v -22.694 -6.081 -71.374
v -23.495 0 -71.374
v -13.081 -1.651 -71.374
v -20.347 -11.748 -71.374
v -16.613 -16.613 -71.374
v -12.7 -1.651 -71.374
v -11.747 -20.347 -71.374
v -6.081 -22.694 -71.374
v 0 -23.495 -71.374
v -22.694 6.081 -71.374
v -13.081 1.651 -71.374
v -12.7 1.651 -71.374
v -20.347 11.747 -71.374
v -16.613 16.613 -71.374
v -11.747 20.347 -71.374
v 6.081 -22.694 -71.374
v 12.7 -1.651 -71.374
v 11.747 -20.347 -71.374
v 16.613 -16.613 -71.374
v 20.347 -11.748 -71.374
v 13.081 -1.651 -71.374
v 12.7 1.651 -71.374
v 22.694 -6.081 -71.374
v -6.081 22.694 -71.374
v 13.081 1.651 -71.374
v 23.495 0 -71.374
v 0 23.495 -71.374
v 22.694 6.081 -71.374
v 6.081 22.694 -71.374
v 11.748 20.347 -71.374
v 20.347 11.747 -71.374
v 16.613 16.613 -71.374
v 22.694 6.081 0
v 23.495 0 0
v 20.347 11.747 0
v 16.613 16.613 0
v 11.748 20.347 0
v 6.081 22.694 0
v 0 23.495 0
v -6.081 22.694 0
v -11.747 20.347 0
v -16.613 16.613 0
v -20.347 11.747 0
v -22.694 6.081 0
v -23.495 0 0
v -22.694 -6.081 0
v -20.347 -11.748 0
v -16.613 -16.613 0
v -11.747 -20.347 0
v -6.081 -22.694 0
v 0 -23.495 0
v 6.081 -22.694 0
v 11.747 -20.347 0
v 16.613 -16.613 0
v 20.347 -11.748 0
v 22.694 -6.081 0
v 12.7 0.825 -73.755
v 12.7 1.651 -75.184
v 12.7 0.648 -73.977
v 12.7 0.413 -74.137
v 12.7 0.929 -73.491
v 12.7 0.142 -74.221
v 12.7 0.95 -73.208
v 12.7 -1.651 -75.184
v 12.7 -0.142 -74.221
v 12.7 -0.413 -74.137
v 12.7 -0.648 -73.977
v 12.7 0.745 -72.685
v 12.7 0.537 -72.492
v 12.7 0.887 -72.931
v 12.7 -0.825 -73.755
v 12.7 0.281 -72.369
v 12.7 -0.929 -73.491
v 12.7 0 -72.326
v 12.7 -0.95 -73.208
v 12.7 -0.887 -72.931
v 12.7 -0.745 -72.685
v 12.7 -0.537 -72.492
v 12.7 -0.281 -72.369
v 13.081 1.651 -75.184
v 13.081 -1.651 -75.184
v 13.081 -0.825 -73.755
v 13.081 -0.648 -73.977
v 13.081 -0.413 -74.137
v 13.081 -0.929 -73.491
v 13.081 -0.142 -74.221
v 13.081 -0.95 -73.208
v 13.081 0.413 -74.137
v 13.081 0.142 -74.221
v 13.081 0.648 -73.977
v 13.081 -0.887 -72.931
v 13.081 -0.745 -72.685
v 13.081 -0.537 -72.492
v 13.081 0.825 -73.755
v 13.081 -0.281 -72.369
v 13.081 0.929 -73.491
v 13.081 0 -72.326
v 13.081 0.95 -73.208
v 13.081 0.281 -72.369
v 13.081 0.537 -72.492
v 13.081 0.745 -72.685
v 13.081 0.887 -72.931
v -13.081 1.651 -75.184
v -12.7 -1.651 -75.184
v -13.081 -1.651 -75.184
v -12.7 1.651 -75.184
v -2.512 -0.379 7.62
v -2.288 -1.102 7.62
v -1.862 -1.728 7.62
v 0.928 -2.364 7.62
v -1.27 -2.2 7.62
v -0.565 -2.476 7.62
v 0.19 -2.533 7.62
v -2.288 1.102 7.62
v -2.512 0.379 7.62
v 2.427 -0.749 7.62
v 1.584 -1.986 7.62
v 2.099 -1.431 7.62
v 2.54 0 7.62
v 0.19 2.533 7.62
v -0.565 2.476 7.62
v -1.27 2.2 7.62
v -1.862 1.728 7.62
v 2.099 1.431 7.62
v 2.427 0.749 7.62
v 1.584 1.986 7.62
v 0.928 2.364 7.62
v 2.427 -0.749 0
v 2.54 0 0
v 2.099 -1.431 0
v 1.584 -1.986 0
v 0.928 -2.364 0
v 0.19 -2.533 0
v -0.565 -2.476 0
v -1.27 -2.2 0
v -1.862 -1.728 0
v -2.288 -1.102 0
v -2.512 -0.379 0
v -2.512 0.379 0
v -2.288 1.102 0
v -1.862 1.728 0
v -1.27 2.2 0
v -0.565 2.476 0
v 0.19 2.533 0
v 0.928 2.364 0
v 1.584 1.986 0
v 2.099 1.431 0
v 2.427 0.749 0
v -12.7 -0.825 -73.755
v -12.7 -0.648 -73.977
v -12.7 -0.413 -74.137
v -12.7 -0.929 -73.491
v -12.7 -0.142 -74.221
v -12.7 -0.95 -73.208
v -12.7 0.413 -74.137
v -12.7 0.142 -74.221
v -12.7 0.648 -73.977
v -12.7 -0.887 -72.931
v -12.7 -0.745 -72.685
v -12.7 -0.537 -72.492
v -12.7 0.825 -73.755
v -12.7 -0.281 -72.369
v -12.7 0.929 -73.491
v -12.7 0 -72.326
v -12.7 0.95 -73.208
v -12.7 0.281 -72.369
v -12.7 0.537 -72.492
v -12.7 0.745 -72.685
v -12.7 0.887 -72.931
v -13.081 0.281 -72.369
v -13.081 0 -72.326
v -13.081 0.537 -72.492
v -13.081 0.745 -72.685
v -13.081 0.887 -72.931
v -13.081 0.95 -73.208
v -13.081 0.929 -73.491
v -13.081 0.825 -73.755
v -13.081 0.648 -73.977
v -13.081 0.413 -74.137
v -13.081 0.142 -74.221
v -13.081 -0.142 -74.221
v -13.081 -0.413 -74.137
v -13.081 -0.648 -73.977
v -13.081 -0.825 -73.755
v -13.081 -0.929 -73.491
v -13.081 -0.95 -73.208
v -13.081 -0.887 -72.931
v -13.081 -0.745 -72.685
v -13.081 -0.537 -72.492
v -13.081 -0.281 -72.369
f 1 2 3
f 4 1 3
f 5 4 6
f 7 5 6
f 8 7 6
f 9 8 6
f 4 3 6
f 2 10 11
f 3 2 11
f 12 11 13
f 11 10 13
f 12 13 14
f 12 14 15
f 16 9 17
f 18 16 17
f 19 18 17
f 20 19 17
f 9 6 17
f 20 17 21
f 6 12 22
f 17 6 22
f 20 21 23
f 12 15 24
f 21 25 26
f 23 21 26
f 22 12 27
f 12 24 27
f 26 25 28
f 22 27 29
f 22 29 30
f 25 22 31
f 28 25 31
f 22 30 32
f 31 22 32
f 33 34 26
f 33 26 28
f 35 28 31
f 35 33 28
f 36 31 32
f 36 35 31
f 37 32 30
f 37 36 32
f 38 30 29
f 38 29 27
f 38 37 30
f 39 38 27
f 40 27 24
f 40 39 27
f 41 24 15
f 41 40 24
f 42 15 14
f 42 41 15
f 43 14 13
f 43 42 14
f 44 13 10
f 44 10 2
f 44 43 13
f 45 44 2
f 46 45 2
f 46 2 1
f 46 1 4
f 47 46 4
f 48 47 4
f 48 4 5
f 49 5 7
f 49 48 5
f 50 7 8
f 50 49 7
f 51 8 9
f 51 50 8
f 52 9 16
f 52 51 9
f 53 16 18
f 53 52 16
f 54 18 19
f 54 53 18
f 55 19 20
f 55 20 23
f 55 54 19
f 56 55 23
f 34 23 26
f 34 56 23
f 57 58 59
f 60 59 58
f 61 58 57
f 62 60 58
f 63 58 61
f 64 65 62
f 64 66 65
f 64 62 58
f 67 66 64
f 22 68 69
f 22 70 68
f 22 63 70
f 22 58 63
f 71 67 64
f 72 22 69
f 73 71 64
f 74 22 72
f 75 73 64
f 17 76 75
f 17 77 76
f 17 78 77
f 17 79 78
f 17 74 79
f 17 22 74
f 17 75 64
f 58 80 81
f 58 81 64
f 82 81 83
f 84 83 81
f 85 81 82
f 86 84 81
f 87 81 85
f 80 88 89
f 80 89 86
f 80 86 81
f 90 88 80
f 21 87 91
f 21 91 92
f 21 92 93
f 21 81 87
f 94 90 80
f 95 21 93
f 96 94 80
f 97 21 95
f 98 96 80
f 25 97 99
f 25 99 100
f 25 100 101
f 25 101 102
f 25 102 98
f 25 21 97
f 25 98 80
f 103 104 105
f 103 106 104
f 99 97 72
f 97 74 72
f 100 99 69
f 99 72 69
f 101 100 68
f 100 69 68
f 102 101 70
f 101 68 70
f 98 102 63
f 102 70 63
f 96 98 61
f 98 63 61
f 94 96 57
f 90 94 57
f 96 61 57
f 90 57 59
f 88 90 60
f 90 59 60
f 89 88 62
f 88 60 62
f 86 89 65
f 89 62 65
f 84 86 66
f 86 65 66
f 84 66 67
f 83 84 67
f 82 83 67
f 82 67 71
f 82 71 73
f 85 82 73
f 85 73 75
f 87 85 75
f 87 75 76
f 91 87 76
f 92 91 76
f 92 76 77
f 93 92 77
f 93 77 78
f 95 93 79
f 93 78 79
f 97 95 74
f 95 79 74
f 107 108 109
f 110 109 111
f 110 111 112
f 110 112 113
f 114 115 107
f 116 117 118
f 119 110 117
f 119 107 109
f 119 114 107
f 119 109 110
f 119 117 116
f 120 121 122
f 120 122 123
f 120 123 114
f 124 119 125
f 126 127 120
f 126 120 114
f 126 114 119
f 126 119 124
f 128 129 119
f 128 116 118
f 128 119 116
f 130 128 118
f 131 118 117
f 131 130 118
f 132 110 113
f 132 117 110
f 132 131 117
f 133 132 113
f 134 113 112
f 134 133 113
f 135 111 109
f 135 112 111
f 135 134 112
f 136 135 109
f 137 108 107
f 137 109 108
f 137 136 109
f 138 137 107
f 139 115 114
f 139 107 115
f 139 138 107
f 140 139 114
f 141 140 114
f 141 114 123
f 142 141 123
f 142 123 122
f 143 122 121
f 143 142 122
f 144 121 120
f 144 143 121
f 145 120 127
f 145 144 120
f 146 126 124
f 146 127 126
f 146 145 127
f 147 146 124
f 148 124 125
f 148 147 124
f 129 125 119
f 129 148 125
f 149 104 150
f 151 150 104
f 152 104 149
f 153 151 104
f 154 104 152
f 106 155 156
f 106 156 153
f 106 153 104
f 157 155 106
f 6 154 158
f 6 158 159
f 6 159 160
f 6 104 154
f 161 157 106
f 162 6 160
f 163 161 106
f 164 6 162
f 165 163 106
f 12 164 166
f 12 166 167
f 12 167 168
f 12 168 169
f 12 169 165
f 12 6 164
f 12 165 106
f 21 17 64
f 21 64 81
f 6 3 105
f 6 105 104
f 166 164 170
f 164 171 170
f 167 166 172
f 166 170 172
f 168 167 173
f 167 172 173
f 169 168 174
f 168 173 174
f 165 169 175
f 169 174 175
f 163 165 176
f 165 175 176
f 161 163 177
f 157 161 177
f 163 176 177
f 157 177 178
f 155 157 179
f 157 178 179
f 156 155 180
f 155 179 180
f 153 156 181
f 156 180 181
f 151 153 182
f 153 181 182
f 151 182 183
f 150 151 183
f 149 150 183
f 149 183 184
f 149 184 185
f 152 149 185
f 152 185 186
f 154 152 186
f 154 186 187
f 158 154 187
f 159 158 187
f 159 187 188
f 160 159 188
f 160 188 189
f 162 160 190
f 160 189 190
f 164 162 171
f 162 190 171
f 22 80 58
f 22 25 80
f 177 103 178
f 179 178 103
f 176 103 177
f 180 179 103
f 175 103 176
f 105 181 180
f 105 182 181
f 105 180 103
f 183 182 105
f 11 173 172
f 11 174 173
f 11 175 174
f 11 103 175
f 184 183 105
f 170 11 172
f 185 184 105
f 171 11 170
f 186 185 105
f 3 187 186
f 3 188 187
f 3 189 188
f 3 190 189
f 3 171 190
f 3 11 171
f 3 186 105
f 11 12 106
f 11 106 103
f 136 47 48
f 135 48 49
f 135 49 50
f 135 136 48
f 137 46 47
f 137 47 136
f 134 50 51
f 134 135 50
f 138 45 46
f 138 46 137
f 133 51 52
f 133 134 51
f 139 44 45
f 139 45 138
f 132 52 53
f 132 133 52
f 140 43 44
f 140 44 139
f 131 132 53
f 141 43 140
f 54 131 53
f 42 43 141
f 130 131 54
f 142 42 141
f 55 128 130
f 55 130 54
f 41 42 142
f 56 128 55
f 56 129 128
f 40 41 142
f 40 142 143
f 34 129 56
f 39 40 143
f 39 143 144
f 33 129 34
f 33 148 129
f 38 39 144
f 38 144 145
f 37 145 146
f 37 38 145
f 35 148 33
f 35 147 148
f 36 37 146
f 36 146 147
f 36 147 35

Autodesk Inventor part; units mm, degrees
ref_plane "YZ Plane" through (0, 0, 0) normal (1, 0, 0) x (0, 1, 0)
ref_plane "XZ Plane" through (0, 0, 0) normal (0, 1, 0) x (-1, 0, 0)
ref_plane "XY Plane" through (0, 0, 0) normal (0, 0, 1) x (1, 0, 0)
sketch "Sketch1" plane through (0, 0, 0) normal (0, 0, 1) x (1, 0, 0)
  circle A0 centre (0, 0) radius 23.495
  dimension "d0" = 46.99
extrude "Extrusion1" add sketch "Sketch1" against normal blind 71.374
sketch "Sketch2" plane through (0, 0, 0) normal (0, 0, 1) x (1, 0, 0)
  circle A0 centre (0, 0) radius 23.495 projected
  circle A1 centre (0, 0) radius 2.54
  dimension "d3" = 5.08
extrude "Extrusion2" add sketch "Sketch2" along normal blind 7.62 contours A1
sketch "Sketch3" plane through (0, 0, -71.374) normal (0, 0, -1) x (-1, 0, 0)
  circle A0 centre (0, 0) radius 23.495 projected
  line L0 (-13.081, 1.651) -> (-12.7, 1.651)
  line L1 (-12.7, 1.651) -> (-12.7, -1.651)
  line L2 (-12.7, -1.651) -> (-13.081, -1.651)
  line L3 (-13.081, -1.651) -> (-13.081, 1.651)
  line L4 (12.7, 1.651) -> (13.081, 1.651)
  line L5 (13.081, 1.651) -> (13.081, -1.651)
  line L6 (13.081, -1.651) -> (12.7, -1.651)
  line L7 (12.7, -1.651) -> (12.7, 1.651)
  dimension "d6" = 3.302
  dimension "d7" = 3.302
  dimension "d8" = 0.381
  dimension "d9" = 0.381
  dimension "d10" = 1.651
  dimension "d11" = 0
  dimension "d12" = 25.4
  dimension "d13" = 12.7
extrude "Extrusion3" add sketch "Sketch3" along normal blind 3.81 contours L0 L1 L2 L3 | L4 L5 L6 L7
sketch "Sketch4" plane through (-13.081, -1.651, -71.374) normal (-1, 0, 0) x (0, 0, 1)
  line L0 (0, 3.302) -> (-3.81, 3.302) projected
  circle A0 centre (-1.905, 1.651) radius 0.9525
  point P0 (71.374, 1.651)
  dimension "d16" = 1.905
  dimension "d17" = 0.6985
extrude "Extrusion4" cut sketch "Sketch4" against normal blind 127
properties part number "RS775 18v"
